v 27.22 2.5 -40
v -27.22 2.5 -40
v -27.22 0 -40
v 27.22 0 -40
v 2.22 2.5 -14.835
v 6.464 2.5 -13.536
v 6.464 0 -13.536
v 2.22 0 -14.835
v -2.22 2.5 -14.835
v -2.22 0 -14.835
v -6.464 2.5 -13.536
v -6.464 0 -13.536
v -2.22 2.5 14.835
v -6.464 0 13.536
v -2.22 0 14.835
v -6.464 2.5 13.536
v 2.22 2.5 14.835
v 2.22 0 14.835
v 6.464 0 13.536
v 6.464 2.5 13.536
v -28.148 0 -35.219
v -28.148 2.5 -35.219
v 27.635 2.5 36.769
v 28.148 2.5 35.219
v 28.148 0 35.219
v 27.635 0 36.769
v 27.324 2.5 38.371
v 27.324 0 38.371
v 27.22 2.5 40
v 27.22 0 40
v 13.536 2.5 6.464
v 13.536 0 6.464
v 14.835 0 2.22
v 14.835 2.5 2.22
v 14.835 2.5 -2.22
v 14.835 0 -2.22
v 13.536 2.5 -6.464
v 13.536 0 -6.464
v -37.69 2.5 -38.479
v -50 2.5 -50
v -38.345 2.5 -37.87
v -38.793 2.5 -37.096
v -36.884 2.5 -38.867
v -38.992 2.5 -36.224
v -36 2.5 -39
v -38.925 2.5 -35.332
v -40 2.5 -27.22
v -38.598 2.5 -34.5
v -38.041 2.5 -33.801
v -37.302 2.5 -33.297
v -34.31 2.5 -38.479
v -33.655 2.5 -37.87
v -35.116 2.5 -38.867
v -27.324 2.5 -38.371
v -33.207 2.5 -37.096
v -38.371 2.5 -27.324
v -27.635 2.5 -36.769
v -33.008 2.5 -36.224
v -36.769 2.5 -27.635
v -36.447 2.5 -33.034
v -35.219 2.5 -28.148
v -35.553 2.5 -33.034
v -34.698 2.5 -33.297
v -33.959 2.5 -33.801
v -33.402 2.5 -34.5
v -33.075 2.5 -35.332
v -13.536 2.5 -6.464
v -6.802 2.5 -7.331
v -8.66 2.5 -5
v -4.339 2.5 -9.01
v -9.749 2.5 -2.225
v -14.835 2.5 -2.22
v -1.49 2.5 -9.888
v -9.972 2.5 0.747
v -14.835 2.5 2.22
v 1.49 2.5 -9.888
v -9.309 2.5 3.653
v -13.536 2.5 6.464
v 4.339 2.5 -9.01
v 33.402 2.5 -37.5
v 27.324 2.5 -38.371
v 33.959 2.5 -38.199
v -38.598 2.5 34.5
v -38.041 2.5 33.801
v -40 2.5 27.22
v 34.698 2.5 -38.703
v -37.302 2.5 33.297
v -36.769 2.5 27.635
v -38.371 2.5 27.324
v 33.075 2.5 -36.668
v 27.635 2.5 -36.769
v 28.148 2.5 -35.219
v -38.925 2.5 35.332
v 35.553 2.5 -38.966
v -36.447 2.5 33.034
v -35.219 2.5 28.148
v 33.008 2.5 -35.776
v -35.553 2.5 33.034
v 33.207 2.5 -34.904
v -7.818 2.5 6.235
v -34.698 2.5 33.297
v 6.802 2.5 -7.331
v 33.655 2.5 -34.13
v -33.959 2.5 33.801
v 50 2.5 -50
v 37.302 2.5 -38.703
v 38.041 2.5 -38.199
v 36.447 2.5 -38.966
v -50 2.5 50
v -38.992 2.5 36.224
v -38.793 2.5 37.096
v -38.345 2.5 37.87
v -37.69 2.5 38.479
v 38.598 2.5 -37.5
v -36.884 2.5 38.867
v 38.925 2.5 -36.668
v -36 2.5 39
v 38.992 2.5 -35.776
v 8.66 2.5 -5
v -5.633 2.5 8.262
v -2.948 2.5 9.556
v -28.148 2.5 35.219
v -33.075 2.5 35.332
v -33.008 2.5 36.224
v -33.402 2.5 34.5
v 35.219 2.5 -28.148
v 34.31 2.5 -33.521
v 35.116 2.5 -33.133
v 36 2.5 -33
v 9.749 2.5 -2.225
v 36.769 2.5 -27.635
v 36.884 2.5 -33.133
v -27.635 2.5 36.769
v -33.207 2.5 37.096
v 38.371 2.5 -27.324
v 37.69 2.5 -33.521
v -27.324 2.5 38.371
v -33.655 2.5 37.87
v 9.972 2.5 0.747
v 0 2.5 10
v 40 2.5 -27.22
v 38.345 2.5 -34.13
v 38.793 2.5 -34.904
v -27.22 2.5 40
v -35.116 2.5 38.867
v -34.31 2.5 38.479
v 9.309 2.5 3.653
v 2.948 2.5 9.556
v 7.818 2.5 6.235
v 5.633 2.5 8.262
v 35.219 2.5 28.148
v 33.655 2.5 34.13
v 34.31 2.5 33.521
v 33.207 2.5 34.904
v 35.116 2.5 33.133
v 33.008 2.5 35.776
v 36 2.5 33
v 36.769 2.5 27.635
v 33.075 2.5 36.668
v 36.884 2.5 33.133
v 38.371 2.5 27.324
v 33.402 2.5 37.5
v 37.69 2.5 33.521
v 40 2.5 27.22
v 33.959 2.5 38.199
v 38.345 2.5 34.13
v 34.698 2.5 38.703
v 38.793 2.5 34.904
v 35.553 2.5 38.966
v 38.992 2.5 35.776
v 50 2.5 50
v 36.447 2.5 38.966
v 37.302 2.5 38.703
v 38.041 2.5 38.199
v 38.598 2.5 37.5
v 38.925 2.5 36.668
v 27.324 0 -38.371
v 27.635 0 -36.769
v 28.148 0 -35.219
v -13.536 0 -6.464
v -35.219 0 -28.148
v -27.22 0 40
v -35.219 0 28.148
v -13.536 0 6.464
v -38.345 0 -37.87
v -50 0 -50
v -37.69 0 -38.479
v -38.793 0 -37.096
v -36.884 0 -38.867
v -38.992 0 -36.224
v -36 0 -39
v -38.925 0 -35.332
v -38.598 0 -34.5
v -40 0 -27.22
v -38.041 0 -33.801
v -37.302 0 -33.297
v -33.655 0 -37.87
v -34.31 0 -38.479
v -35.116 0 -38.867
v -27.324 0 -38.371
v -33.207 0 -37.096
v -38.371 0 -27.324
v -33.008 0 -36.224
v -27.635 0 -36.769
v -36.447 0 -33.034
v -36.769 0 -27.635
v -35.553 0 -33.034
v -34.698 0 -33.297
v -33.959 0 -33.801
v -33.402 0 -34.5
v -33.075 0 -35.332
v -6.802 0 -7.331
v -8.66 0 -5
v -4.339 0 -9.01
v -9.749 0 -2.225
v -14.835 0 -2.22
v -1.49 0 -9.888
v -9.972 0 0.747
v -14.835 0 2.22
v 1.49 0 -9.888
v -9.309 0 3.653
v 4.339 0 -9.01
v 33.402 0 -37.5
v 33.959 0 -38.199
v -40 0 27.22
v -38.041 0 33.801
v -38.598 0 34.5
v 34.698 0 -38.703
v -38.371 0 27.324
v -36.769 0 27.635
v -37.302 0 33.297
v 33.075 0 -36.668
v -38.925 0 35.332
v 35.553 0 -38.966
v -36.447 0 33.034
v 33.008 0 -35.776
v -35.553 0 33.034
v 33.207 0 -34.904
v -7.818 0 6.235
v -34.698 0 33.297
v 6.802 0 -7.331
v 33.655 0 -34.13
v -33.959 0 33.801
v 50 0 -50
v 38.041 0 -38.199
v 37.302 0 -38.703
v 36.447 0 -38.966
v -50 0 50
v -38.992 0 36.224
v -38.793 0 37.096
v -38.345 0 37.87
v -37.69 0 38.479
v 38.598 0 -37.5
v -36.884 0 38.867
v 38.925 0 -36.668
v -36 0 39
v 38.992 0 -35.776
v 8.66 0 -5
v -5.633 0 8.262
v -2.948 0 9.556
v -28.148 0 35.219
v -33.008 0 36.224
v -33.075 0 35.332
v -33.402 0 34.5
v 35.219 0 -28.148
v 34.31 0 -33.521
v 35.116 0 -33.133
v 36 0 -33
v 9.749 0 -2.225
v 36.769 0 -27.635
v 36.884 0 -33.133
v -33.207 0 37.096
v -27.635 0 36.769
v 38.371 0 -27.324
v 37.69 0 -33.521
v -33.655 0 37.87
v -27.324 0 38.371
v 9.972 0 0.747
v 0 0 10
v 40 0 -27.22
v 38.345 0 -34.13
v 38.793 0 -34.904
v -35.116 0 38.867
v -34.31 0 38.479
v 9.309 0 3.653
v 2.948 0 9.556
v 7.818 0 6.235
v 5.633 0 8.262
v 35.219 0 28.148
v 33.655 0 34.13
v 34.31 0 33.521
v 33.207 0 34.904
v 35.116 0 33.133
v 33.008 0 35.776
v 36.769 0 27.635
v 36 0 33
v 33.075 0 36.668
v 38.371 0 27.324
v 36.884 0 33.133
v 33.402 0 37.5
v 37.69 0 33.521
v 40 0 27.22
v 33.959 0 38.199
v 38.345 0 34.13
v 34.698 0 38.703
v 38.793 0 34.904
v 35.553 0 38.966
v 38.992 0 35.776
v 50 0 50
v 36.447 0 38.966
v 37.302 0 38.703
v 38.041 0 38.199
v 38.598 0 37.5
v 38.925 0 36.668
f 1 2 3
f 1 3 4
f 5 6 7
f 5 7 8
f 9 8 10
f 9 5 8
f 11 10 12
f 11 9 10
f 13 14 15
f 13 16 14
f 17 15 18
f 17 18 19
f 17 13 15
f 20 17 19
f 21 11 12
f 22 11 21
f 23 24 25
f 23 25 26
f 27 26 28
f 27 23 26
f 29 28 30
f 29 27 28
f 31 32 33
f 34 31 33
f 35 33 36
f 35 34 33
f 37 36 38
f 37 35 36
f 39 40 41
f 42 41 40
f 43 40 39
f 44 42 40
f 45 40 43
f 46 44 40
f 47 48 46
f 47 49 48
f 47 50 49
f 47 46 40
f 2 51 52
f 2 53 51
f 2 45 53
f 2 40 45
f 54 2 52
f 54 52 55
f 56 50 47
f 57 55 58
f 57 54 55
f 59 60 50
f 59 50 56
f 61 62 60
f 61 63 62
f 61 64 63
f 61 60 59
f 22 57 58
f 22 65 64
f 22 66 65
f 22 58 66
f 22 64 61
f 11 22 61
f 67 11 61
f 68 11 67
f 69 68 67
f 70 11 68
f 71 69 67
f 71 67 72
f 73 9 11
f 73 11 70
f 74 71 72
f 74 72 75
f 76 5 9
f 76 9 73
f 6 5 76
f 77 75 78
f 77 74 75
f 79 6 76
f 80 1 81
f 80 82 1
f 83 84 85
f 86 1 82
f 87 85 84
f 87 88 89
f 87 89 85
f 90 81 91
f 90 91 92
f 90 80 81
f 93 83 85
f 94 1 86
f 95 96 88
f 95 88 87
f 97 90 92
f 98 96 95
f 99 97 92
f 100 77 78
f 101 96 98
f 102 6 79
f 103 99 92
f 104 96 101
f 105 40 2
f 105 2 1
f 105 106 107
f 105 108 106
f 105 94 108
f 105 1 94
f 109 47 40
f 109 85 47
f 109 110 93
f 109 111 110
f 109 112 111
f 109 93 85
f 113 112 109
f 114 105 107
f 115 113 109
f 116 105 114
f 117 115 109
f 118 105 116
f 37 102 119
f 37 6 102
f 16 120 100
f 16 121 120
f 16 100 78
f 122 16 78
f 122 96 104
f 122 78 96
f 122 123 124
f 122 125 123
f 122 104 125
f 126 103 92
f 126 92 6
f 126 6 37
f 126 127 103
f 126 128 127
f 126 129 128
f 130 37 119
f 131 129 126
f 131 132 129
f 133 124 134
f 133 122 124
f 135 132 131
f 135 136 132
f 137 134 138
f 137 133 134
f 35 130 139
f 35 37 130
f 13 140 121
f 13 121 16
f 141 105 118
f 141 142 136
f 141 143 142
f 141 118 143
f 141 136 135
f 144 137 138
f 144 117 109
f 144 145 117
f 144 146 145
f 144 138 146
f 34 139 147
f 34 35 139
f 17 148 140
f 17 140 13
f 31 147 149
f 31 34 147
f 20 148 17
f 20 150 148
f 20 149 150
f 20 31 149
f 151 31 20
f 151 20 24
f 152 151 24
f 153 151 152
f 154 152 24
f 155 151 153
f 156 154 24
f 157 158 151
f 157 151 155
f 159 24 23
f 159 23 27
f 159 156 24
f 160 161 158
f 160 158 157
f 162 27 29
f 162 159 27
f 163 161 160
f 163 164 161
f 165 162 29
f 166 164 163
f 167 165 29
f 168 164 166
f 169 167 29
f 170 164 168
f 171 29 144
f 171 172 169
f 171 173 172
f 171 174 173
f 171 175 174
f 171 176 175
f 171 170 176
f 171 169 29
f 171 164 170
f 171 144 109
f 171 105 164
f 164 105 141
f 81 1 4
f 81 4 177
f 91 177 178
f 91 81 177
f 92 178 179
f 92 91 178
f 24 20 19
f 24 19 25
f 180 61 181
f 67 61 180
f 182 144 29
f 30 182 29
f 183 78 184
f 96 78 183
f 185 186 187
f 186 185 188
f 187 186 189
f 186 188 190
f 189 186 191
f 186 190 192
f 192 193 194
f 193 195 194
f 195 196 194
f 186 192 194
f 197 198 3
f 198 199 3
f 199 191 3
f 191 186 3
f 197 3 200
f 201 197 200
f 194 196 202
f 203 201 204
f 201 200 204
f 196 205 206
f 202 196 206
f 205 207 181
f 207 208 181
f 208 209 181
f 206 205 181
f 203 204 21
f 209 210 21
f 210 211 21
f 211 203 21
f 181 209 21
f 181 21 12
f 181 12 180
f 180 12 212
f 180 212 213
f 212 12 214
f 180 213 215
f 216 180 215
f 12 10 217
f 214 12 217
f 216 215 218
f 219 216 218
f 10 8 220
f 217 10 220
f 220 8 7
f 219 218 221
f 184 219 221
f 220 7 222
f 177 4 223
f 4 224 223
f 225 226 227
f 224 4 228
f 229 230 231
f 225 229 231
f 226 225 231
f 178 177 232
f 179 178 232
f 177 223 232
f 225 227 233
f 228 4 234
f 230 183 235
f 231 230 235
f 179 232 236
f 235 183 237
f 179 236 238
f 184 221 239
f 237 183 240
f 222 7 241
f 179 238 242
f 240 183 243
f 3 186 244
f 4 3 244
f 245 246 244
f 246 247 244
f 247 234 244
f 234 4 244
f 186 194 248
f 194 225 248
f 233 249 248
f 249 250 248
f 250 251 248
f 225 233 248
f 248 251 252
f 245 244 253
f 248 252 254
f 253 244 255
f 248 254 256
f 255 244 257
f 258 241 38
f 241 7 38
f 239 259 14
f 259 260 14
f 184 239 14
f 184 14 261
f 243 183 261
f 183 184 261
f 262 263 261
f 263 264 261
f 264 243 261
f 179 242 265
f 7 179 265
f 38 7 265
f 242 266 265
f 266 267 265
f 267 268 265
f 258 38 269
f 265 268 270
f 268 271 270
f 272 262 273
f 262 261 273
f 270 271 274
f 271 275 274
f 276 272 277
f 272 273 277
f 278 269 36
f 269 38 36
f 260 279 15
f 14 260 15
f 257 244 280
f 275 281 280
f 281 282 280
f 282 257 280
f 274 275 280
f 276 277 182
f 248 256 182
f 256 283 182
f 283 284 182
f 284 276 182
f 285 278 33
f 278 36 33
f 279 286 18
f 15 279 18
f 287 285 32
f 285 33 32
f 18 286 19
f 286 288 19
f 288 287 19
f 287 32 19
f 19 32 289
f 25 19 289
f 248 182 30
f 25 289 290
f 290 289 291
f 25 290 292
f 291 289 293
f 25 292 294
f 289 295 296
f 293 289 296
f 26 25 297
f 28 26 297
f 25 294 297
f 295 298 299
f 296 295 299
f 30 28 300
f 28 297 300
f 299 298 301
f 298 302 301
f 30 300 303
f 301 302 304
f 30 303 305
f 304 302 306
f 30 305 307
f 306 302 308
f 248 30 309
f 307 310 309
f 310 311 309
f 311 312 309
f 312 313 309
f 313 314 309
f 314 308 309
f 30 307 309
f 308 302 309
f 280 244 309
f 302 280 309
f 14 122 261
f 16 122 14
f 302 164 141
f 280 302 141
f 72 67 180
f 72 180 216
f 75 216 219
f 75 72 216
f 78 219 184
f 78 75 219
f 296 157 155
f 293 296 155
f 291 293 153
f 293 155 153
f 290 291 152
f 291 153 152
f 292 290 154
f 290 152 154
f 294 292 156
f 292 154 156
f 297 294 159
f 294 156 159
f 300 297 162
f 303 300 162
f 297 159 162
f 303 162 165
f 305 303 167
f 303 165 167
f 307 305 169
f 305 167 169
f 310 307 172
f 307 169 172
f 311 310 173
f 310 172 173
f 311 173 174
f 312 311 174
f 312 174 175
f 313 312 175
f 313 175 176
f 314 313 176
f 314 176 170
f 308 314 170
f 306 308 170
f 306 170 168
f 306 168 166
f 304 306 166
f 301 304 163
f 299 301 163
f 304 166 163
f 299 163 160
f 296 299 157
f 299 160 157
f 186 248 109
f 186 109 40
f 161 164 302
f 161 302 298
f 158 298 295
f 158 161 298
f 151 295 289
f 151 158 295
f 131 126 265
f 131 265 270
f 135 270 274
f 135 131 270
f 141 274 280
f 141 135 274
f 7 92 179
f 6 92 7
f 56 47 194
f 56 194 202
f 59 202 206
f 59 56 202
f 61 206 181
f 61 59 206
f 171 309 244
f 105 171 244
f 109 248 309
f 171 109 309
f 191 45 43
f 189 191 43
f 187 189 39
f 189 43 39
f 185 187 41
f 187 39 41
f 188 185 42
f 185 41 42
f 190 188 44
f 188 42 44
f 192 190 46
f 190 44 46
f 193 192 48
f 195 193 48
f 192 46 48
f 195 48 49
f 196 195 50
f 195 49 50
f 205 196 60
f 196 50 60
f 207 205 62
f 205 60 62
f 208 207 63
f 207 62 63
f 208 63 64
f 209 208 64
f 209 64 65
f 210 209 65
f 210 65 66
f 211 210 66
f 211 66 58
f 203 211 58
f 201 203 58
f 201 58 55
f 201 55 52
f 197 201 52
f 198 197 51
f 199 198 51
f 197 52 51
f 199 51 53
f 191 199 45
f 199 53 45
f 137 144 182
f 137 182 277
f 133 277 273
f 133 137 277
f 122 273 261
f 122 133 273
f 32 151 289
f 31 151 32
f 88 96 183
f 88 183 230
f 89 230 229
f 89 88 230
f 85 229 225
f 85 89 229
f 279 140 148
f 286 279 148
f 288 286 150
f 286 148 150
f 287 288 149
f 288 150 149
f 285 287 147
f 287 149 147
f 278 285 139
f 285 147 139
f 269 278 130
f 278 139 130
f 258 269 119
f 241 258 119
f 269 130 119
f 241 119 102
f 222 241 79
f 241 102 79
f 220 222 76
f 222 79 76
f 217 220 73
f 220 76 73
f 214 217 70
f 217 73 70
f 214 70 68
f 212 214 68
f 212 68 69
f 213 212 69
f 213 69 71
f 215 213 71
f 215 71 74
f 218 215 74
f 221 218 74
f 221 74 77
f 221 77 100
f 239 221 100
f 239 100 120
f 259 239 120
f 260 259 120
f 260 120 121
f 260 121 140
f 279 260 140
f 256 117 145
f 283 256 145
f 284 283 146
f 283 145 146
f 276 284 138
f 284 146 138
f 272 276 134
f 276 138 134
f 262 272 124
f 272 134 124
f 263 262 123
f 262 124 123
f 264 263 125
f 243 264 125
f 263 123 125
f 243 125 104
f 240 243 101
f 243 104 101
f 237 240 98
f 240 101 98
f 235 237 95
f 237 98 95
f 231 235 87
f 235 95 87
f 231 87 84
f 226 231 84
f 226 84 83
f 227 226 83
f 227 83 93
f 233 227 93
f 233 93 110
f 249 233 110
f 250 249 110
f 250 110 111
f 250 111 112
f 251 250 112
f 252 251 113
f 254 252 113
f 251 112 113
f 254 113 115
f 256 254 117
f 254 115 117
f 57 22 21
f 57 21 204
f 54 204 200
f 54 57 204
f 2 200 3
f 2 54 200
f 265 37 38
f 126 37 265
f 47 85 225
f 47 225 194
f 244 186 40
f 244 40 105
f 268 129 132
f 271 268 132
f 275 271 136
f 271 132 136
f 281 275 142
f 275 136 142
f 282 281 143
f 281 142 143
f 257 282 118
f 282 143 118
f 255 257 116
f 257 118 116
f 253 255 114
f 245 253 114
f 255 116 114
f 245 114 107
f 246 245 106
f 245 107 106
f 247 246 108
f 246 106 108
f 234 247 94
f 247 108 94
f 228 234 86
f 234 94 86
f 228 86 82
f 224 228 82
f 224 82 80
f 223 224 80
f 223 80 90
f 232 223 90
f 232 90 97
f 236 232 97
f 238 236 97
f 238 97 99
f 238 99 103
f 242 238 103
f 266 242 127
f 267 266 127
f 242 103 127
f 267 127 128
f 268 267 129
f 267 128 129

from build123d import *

# Parameters (mm, degrees)
SKETCH1_W           = 100
SKETCH1_H           = 100
BOSS_EXTRUDE1_DEPTH = 2.5
SKETCH5_W           = 80
SKETCH5_H           = 80
CUT_EXTRUDE2_DEPTH  = 4
SKETCH6_R           = 15
BOSS_EXTRUDE3_DEPTH = 2.5
SKETCH7_W           = 5
SKETCH7_H           = 5
CUT_EXTRUDE3_DEPTH  = 2.5
BOSS_EXTRUDE4_DEPTH = 2.5
EXTRUDE_THIN2_DEPTH = 2.5
SKETCH10_R          = 3
CUT_EXTRUDE5_DEPTH  = 2.5
SKETCH12_R          = 10
CUT_EXTRUDE7_DEPTH  = 10


with BuildPart() as part:
    # Sketch1 → Boss-Extrude1 (new body)
    with BuildSketch(Plane(origin=(0, 0, 0), x_dir=(1, 0, 0), z_dir=(0, 1, 0))):
        Rectangle(SKETCH1_W, SKETCH1_H)
    extrude(amount=BOSS_EXTRUDE1_DEPTH)

    # Sketch5 → Cut-Extrude2 (cut)
    with BuildSketch(Plane(origin=(0, 2.5, 0), x_dir=(1, 0, 0), z_dir=(0, 1, 0))):
        Rectangle(SKETCH5_W, SKETCH5_H)
    extrude(amount=-CUT_EXTRUDE2_DEPTH, mode=Mode.SUBTRACT)

    # Sketch8 → Boss-Extrude4 (add)
    with BuildSketch(Plane(origin=(0, 2.5, 0), x_dir=(1, 0, 0), z_dir=(0, 1, 0))):
        with BuildLine():
            Line((-40, -40), (-27.220069463, -40))
            ThreePointArc((-27.220069463, -40), (-30.963224454, -30.963224454), (-40, -27.220069463))
            Line((-40, -27.220069463), (-40, -40))
        make_face()
        with BuildLine():
            ThreePointArc((-40, 27.220069463), (-30.963224454, 30.963224454), (-27.220069463, 40))
            Line((-27.220069463, 40), (-40, 40))
            Line((-40, 40), (-40, 27.220069463))
        make_face()
        with BuildLine():
            Line((40, 40), (27.220069463, 40))
            ThreePointArc((27.220069463, 40), (30.963224454, 30.963224454), (40, 27.220069463))
            Line((40, 27.220069463), (40, 40))
        make_face()
        with BuildLine():
            ThreePointArc((40, -27.220069463), (30.963224454, -30.963224454), (27.220069463, -40))
            Line((27.220069463, -40), (40, -40))
            Line((40, -40), (40, -27.220069463))
        make_face()
    extrude(amount=-BOSS_EXTRUDE4_DEPTH)



with BuildPart() as body_2:
    # Sketch6 → Boss-Extrude3 (new body)
    with BuildSketch(Plane(origin=(0, 2.5, 0), x_dir=(1, 0, 0), z_dir=(0, 1, 0))):
        with Locations(Location((0, 0, 0), (0, 0, 270))):
            Circle(SKETCH6_R)
    extrude(amount=-BOSS_EXTRUDE3_DEPTH)

    # Sketch7 → Cut-Extrude3 (cut)
    with BuildSketch(Plane(origin=(0, 2.5, 0), x_dir=(1, 0, 0), z_dir=(0, 1, 0))):
        Rectangle(SKETCH7_W, SKETCH7_H)
    extrude(amount=-CUT_EXTRUDE3_DEPTH, mode=Mode.SUBTRACT)


with BuildPart() as part_1:
    add(part.part)

    add(body_2.part)  # Extrude-Thin2 merges body 2
    # Sketch9 → Extrude-Thin2 (add)
    with BuildSketch(Plane(origin=(0, 2.5, 0), x_dir=(1, 0, 0), z_dir=(0, 1, 0))):
        Polygon((-1.035533906, -6.035533906), (34.46870341, -41.539771222), (41.539771222, -34.46870341), (6.035533906, 1.035533906), align=None)
        Polygon((-11.285533906, -4.214466094), (-41.539771222, -34.46870341), (-34.46870341, -41.539771222), (-4.214466094, -11.285533906), align=None)
        Polygon((11.285533906, 4.214466094), (41.539771222, 34.46870341), (34.46870341, 41.539771222), (4.214466094, 11.285533906), align=None)
        Polygon((-4.214466094, 11.285533906), (-34.46870341, 41.539771222), (-41.539771222, 34.46870341), (-11.285533906, 4.214466094), align=None)
    extrude(amount=-EXTRUDE_THIN2_DEPTH)

    # Sketch10 → Cut-Extrude5 (cut)
    with BuildSketch(Plane(origin=(0, 2.5, 0), x_dir=(1, 0, 0), z_dir=(0, 1, 0))):
        with Locations(Location((36, 36, 0), (0, 0, 270))):
            Circle(SKETCH10_R)
        with Locations(Location((-36, 36, 0), (0, 0, 90))):
            Circle(SKETCH10_R)
        with Locations(Location((36, -36, 0), (0, 0, 90))):
            Circle(SKETCH10_R)
        with Locations(Location((-36, -36, 0), (0, 0, 270))):
            Circle(SKETCH10_R)
    extrude(amount=-CUT_EXTRUDE5_DEPTH, mode=Mode.SUBTRACT)

    # Sketch12 → Cut-Extrude7 (cut)
    with BuildSketch(Plane(origin=(0, 2.5, 0), x_dir=(1, 0, 0), z_dir=(0, 1, 0))):
        with Locations(Location((0, 0, 0), (0, 0, 270))):
            Circle(SKETCH12_R)
    extrude(amount=-CUT_EXTRUDE7_DEPTH, mode=Mode.SUBTRACT)


solid = part_1.part
